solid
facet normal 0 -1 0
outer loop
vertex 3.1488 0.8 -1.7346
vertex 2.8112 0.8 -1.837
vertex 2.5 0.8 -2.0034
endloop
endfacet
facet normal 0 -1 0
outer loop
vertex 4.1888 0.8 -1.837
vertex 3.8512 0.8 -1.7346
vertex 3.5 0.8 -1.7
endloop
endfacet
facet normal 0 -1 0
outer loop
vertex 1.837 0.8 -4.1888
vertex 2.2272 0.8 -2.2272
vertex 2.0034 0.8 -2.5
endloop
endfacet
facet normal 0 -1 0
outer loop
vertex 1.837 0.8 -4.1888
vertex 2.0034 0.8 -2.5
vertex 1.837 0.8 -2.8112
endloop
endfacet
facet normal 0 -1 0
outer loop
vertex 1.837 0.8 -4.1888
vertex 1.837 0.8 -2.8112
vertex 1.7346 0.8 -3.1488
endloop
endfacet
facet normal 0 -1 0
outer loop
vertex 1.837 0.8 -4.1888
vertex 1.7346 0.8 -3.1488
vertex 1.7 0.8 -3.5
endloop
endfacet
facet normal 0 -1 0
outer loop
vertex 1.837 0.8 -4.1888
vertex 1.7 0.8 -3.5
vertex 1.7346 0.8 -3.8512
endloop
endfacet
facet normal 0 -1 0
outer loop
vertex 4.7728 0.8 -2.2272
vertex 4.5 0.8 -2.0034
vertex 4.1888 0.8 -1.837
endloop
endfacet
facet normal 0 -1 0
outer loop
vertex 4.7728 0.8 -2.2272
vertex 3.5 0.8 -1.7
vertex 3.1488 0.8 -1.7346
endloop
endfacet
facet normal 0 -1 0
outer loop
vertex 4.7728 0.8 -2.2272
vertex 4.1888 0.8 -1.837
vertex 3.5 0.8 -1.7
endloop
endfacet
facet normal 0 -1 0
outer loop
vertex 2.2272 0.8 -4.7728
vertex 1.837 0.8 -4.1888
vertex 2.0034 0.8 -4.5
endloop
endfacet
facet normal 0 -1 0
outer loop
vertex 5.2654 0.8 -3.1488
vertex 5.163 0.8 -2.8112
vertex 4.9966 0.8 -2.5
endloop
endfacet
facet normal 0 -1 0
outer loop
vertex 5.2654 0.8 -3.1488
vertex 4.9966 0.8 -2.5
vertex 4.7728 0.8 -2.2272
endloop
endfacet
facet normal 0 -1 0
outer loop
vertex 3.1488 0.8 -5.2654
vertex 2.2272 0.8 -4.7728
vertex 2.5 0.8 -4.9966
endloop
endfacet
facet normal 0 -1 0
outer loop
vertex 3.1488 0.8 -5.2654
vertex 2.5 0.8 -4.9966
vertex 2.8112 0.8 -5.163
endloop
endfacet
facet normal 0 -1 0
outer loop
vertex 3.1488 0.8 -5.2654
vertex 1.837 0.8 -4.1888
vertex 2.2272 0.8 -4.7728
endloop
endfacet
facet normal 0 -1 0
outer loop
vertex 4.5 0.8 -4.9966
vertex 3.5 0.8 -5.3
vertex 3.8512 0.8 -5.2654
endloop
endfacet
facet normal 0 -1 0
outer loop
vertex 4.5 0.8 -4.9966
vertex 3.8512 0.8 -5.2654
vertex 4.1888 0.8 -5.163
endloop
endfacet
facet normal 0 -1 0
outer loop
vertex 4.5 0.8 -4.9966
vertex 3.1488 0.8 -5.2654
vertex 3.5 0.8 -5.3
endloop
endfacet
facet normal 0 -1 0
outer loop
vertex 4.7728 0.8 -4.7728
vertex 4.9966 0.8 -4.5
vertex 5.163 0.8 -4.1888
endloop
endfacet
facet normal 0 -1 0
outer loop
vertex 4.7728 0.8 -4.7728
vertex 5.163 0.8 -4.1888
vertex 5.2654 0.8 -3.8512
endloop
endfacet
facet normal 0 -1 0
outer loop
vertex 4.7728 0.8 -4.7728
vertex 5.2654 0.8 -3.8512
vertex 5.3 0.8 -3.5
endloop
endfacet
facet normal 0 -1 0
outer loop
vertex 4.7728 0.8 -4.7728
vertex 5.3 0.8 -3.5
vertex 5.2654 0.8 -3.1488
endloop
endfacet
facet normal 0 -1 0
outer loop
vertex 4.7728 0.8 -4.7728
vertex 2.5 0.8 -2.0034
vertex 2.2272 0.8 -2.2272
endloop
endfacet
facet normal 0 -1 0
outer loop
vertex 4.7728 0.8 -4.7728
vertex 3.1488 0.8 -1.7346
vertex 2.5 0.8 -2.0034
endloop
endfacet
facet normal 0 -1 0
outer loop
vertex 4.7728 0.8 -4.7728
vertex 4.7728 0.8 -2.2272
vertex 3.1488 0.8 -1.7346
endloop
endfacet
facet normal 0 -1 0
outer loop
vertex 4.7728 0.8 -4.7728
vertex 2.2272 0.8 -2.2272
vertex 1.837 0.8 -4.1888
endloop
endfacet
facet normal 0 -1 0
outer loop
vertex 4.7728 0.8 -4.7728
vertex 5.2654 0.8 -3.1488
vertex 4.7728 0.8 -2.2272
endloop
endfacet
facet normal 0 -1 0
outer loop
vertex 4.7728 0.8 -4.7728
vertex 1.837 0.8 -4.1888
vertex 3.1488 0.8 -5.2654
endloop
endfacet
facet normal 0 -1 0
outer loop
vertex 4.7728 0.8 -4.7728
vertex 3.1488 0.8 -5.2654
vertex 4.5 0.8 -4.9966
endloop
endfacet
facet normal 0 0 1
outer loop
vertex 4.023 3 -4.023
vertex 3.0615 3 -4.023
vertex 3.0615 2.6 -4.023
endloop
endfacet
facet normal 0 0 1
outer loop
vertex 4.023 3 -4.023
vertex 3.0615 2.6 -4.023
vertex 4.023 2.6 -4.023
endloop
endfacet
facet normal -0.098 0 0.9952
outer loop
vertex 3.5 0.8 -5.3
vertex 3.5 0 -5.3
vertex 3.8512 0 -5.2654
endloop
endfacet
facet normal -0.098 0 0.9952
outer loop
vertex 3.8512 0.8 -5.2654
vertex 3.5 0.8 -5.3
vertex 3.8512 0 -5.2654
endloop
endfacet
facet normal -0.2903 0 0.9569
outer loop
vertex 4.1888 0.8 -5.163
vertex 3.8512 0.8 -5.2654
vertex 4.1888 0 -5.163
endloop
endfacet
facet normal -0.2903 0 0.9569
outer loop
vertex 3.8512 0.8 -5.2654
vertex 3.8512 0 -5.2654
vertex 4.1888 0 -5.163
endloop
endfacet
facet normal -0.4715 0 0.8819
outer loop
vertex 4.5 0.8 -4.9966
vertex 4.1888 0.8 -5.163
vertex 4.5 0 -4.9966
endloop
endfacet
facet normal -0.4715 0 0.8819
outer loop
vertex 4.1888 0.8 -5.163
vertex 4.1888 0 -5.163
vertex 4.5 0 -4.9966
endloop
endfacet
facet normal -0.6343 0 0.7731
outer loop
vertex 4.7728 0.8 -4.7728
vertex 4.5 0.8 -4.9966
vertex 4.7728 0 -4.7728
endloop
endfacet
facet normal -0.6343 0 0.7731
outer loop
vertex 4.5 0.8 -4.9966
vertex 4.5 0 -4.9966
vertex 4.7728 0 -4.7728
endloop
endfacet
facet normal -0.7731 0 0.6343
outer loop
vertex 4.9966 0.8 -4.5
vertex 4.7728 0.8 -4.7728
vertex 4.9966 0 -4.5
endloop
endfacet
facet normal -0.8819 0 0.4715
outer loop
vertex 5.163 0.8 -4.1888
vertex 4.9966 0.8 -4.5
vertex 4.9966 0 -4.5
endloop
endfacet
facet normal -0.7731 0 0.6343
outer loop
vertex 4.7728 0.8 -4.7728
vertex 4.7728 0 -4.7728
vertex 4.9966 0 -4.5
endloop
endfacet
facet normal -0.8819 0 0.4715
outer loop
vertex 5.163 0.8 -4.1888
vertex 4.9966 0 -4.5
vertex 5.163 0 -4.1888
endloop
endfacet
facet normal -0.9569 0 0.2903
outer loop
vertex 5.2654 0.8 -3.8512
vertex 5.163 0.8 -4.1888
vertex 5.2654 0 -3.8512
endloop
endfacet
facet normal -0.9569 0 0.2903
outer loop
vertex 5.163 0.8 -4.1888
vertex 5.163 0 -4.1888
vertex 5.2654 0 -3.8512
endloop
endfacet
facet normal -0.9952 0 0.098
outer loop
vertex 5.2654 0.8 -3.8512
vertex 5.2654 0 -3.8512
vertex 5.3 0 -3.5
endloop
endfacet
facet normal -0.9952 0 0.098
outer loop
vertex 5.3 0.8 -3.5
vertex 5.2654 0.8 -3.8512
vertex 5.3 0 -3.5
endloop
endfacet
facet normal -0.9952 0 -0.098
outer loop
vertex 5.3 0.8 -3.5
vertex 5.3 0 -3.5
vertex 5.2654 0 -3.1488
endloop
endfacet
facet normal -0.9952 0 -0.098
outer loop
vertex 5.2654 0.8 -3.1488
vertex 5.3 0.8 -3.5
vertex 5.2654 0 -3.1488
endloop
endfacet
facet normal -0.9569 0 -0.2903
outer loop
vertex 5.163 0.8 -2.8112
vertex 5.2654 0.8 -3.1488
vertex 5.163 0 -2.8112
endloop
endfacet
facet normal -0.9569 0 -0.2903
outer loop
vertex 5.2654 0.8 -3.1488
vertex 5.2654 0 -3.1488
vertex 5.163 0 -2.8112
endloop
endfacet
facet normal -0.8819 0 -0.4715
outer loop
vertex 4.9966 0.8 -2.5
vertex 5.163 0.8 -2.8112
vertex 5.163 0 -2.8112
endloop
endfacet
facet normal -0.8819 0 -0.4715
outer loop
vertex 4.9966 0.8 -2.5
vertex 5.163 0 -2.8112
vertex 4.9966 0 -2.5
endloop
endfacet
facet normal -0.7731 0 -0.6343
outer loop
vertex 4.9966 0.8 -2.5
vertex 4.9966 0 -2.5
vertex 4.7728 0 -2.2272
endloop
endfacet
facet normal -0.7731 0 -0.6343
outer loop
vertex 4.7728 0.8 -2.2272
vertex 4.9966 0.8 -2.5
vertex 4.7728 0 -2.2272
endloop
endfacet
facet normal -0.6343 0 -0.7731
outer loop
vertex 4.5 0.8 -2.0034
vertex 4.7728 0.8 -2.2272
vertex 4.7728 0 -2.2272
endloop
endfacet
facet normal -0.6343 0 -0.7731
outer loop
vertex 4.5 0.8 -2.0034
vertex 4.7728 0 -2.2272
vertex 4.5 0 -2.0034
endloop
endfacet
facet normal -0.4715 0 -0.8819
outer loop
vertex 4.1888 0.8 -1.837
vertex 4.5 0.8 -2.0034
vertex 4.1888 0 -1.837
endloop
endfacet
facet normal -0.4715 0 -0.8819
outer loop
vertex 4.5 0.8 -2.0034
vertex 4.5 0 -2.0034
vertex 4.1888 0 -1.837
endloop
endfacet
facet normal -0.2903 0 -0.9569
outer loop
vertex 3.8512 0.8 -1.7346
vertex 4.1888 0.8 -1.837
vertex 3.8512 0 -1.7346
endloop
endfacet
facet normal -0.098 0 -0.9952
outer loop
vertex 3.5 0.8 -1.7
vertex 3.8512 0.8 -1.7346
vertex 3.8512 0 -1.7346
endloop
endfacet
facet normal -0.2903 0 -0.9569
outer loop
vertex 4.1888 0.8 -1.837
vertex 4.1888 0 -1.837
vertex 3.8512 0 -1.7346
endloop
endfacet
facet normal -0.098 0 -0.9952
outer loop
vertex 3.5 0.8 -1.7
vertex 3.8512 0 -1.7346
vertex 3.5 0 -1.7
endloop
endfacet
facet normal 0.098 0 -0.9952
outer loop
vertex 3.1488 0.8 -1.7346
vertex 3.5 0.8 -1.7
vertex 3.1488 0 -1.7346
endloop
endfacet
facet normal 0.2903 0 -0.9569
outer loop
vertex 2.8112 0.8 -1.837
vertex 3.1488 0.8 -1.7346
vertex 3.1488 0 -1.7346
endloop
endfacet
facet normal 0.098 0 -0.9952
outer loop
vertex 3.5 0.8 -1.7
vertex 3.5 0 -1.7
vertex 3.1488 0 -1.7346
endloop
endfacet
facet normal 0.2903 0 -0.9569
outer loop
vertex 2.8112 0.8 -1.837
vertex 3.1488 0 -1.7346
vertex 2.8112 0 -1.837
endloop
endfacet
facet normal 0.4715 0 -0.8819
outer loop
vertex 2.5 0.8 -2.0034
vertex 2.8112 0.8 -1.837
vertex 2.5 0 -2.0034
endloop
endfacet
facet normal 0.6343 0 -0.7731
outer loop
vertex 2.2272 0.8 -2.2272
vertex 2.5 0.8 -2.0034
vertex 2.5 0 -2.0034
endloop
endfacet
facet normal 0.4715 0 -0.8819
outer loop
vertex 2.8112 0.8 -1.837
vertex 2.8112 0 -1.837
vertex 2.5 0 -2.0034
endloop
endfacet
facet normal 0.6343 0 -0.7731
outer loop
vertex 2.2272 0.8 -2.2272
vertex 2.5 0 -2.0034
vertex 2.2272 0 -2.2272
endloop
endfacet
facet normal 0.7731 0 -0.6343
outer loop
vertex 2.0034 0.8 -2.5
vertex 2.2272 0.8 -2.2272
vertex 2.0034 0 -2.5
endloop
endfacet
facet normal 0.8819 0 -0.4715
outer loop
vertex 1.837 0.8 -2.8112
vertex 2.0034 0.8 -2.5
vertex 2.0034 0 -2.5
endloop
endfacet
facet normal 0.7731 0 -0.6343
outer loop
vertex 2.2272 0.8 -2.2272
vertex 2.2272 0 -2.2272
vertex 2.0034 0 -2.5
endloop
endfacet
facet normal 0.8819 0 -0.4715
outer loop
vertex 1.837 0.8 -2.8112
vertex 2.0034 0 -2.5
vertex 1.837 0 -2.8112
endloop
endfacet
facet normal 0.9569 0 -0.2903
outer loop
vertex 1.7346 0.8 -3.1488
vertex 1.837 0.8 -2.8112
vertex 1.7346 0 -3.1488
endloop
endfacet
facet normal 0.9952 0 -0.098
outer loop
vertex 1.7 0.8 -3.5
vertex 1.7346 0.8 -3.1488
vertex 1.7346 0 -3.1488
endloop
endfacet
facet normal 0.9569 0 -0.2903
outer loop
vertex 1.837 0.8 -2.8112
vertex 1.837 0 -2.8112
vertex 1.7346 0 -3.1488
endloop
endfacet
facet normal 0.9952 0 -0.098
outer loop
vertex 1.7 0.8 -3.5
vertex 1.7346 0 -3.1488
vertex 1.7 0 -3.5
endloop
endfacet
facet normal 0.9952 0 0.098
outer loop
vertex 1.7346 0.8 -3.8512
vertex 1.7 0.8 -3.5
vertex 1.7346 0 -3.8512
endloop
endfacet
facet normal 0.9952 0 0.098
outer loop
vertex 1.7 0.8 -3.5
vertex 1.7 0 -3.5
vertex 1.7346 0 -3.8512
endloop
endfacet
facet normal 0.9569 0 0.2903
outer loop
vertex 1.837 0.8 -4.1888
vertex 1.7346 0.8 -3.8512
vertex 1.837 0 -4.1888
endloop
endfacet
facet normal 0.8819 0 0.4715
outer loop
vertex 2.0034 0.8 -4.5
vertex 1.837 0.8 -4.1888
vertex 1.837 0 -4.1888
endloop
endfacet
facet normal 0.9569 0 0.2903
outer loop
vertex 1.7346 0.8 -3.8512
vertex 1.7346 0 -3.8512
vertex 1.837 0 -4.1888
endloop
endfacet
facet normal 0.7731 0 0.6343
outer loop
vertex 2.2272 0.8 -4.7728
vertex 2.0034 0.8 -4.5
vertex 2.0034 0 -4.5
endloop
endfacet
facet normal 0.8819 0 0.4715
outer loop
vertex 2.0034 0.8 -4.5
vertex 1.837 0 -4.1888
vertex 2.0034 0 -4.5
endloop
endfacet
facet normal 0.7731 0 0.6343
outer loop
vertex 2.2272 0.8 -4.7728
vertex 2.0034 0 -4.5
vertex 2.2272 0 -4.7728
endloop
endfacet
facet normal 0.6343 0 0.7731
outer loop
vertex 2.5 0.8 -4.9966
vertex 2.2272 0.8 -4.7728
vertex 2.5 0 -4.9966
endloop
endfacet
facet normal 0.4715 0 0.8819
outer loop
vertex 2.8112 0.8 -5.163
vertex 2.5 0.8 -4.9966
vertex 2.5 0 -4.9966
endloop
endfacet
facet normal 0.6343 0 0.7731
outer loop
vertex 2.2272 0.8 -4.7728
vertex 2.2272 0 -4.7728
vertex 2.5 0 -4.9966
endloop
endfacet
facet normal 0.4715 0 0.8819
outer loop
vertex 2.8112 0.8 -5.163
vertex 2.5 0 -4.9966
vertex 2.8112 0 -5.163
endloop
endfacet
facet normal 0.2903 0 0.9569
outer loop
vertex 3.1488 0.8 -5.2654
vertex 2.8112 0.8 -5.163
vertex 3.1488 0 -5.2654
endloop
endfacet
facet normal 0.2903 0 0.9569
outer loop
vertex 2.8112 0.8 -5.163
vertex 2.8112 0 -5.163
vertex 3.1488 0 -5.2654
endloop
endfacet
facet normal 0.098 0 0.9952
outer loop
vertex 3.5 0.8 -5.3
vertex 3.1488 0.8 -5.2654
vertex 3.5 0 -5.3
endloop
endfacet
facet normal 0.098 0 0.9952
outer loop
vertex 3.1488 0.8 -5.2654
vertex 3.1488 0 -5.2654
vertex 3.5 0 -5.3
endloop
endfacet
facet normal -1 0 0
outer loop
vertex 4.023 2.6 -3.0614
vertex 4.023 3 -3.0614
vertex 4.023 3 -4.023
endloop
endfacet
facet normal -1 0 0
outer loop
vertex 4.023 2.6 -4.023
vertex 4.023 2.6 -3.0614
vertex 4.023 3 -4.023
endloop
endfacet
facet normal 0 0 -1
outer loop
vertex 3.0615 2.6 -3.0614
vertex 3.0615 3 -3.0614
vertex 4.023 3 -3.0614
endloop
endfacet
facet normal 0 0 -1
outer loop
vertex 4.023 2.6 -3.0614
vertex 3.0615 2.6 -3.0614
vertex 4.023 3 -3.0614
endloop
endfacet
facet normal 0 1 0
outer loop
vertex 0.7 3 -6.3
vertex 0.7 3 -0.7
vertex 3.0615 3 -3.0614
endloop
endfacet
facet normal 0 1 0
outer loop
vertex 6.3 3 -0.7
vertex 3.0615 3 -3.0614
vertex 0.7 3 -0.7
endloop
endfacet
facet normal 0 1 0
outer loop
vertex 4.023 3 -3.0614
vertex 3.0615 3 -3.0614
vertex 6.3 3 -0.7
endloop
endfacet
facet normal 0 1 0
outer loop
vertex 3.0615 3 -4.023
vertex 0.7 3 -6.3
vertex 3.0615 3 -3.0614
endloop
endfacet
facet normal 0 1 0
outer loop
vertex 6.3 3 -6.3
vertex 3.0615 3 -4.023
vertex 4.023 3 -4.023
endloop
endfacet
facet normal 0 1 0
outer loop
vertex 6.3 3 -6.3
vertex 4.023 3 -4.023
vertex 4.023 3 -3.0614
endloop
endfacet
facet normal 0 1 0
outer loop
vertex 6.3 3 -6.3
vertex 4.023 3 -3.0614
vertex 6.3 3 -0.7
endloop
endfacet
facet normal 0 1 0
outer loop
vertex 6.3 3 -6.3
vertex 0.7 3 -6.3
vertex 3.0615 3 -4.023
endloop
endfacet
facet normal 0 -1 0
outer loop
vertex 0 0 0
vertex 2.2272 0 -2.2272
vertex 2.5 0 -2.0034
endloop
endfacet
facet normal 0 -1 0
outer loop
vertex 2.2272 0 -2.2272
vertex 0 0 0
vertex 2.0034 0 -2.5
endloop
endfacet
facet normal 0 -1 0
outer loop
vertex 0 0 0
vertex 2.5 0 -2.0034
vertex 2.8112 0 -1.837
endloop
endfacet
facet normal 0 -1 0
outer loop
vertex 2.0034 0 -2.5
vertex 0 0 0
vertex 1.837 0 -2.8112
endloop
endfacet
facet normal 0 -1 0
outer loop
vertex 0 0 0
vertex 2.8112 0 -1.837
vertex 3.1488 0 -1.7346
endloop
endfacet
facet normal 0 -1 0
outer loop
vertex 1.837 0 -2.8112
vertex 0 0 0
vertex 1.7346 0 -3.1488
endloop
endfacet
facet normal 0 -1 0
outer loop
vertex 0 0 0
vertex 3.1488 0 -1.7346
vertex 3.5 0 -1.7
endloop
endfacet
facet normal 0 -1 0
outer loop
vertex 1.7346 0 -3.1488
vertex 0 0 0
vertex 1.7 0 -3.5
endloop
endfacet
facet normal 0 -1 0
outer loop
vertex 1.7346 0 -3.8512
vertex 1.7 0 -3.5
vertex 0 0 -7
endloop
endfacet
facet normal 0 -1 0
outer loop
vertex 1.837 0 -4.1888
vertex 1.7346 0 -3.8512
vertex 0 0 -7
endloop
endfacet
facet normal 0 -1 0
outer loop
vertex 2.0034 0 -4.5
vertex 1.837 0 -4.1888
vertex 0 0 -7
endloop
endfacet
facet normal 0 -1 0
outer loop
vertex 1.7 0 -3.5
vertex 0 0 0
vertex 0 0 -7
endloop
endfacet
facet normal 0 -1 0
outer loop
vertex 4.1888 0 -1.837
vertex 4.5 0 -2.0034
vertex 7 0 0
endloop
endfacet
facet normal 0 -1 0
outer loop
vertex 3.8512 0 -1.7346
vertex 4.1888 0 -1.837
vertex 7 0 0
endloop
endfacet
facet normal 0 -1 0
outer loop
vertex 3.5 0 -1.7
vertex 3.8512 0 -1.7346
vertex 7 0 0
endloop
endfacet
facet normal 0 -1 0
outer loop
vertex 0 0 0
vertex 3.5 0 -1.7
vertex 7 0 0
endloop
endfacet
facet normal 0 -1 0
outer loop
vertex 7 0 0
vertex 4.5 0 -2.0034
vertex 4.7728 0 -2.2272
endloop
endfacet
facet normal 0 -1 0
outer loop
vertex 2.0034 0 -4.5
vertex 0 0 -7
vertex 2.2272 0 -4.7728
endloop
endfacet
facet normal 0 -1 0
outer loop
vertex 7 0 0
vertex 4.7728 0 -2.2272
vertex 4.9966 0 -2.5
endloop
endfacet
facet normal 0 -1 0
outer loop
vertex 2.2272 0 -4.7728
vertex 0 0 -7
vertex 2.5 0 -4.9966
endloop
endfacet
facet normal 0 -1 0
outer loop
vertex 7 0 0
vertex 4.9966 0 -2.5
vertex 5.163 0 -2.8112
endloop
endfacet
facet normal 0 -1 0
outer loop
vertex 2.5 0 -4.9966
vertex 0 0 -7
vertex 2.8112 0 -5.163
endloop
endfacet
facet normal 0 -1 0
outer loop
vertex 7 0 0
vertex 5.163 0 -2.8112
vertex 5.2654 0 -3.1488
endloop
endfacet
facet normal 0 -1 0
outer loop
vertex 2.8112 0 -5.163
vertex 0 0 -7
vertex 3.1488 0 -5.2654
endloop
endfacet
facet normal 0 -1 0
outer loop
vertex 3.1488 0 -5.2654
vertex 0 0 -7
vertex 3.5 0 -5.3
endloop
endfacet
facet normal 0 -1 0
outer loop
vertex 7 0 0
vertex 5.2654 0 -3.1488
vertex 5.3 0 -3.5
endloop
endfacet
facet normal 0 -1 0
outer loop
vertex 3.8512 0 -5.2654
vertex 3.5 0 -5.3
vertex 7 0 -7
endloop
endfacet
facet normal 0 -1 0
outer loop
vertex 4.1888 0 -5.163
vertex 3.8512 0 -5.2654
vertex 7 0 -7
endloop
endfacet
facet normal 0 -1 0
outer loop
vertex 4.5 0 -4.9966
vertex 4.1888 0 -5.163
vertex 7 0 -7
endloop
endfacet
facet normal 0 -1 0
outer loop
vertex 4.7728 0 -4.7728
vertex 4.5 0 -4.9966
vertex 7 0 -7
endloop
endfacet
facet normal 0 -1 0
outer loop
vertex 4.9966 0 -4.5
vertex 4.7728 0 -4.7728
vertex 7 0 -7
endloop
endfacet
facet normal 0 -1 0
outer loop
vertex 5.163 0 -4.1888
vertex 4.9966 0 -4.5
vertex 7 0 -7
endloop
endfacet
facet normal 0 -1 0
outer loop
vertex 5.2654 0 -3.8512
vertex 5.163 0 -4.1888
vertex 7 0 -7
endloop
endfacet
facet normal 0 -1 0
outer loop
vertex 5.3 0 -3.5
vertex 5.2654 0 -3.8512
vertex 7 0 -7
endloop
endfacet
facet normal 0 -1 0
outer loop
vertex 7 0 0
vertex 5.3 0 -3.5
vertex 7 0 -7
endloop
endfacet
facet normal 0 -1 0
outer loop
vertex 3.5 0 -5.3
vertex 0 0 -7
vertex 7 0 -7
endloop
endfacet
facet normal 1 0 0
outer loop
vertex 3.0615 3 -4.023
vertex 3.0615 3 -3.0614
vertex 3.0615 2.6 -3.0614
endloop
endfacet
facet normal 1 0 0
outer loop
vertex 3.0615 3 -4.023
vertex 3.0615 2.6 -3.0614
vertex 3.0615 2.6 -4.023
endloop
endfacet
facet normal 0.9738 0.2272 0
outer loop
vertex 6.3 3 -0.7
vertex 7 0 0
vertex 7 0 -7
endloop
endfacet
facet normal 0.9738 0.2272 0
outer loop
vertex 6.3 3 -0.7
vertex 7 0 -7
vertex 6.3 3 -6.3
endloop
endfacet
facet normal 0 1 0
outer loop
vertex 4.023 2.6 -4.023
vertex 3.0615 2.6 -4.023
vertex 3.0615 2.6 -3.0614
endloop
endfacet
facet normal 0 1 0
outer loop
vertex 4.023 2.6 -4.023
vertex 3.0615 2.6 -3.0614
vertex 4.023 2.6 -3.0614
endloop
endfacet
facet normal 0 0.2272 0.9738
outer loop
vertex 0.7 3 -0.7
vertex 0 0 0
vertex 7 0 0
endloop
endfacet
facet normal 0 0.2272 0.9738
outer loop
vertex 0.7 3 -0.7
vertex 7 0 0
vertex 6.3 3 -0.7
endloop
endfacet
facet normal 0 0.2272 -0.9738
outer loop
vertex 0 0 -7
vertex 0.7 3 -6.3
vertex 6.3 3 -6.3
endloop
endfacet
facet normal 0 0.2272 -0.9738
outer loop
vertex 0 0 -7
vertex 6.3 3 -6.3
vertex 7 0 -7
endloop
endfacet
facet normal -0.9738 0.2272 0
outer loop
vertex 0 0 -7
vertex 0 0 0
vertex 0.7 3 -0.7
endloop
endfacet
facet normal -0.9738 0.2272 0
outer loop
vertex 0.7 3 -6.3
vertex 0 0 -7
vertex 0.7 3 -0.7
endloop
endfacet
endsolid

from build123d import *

# Parameters (mm, degrees)
SKETCH1_W           = 7
SKETCH1_H           = 7
BOSS_EXTRUDE1_DEPTH = 3
CUT_EXTRUDE1_DEPTH  = 7
CUT_EXTRUDE2_DEPTH  = 11
SKETCH4_R           = 1.8
CUT_EXTRUDE3_DEPTH  = 0.8
SKETCH5_W           = 0.961538462
SKETCH5_H           = 0.961538462
CUT_EXTRUDE4_DEPTH  = 0.4


with BuildPart() as part:
    # Sketch1 → Boss-Extrude1 (new body)
    with BuildSketch(Plane(origin=(0, 0, 0), x_dir=(1, 0, 0), z_dir=(0, 1, 0))):
        with Locations((3.5, 3.5)):
            Rectangle(SKETCH1_W, SKETCH1_H)
    extrude(amount=BOSS_EXTRUDE1_DEPTH)

    # Sketch2 → Cut-Extrude1 (cut)
    with BuildSketch(Plane.XY):
        Polygon((0, 0), (0.7, 3), (0, 3), align=None)
        Polygon((7, 0), (6.3, 3), (7, 3), align=None)
    extrude(amount=-CUT_EXTRUDE1_DEPTH, mode=Mode.SUBTRACT)

    # Sketch3 → Cut-Extrude2 (cut)
    with BuildSketch(Plane(origin=(0, 0, 0), x_dir=(0, 0, -1), z_dir=(1, 0, 0))):
        Polygon((0, 0), (0.7, 3), (0, 3), align=None)
        Polygon((7, 3), (6.3, 3), (7, 0), align=None)
    extrude(amount=CUT_EXTRUDE2_DEPTH, mode=Mode.SUBTRACT)

    # Sketch4 → Cut-Extrude3 (cut)
    with BuildSketch(Plane.XZ):
        with Locations(Location((3.5, -3.5, 0), (0, 0, 270))):
            Circle(SKETCH4_R)
    extrude(amount=-CUT_EXTRUDE3_DEPTH, mode=Mode.SUBTRACT)

    # Sketch5 → Cut-Extrude4 (cut)
    with BuildSketch(Plane(origin=(0, 3, 0), x_dir=(1, 0, 0), z_dir=(0, 1, 0))):
        with Locations((3.542267308, 3.542216335)):
            Rectangle(SKETCH5_W, SKETCH5_H)
    extrude(amount=-CUT_EXTRUDE4_DEPTH, mode=Mode.SUBTRACT)


solid = part.part
